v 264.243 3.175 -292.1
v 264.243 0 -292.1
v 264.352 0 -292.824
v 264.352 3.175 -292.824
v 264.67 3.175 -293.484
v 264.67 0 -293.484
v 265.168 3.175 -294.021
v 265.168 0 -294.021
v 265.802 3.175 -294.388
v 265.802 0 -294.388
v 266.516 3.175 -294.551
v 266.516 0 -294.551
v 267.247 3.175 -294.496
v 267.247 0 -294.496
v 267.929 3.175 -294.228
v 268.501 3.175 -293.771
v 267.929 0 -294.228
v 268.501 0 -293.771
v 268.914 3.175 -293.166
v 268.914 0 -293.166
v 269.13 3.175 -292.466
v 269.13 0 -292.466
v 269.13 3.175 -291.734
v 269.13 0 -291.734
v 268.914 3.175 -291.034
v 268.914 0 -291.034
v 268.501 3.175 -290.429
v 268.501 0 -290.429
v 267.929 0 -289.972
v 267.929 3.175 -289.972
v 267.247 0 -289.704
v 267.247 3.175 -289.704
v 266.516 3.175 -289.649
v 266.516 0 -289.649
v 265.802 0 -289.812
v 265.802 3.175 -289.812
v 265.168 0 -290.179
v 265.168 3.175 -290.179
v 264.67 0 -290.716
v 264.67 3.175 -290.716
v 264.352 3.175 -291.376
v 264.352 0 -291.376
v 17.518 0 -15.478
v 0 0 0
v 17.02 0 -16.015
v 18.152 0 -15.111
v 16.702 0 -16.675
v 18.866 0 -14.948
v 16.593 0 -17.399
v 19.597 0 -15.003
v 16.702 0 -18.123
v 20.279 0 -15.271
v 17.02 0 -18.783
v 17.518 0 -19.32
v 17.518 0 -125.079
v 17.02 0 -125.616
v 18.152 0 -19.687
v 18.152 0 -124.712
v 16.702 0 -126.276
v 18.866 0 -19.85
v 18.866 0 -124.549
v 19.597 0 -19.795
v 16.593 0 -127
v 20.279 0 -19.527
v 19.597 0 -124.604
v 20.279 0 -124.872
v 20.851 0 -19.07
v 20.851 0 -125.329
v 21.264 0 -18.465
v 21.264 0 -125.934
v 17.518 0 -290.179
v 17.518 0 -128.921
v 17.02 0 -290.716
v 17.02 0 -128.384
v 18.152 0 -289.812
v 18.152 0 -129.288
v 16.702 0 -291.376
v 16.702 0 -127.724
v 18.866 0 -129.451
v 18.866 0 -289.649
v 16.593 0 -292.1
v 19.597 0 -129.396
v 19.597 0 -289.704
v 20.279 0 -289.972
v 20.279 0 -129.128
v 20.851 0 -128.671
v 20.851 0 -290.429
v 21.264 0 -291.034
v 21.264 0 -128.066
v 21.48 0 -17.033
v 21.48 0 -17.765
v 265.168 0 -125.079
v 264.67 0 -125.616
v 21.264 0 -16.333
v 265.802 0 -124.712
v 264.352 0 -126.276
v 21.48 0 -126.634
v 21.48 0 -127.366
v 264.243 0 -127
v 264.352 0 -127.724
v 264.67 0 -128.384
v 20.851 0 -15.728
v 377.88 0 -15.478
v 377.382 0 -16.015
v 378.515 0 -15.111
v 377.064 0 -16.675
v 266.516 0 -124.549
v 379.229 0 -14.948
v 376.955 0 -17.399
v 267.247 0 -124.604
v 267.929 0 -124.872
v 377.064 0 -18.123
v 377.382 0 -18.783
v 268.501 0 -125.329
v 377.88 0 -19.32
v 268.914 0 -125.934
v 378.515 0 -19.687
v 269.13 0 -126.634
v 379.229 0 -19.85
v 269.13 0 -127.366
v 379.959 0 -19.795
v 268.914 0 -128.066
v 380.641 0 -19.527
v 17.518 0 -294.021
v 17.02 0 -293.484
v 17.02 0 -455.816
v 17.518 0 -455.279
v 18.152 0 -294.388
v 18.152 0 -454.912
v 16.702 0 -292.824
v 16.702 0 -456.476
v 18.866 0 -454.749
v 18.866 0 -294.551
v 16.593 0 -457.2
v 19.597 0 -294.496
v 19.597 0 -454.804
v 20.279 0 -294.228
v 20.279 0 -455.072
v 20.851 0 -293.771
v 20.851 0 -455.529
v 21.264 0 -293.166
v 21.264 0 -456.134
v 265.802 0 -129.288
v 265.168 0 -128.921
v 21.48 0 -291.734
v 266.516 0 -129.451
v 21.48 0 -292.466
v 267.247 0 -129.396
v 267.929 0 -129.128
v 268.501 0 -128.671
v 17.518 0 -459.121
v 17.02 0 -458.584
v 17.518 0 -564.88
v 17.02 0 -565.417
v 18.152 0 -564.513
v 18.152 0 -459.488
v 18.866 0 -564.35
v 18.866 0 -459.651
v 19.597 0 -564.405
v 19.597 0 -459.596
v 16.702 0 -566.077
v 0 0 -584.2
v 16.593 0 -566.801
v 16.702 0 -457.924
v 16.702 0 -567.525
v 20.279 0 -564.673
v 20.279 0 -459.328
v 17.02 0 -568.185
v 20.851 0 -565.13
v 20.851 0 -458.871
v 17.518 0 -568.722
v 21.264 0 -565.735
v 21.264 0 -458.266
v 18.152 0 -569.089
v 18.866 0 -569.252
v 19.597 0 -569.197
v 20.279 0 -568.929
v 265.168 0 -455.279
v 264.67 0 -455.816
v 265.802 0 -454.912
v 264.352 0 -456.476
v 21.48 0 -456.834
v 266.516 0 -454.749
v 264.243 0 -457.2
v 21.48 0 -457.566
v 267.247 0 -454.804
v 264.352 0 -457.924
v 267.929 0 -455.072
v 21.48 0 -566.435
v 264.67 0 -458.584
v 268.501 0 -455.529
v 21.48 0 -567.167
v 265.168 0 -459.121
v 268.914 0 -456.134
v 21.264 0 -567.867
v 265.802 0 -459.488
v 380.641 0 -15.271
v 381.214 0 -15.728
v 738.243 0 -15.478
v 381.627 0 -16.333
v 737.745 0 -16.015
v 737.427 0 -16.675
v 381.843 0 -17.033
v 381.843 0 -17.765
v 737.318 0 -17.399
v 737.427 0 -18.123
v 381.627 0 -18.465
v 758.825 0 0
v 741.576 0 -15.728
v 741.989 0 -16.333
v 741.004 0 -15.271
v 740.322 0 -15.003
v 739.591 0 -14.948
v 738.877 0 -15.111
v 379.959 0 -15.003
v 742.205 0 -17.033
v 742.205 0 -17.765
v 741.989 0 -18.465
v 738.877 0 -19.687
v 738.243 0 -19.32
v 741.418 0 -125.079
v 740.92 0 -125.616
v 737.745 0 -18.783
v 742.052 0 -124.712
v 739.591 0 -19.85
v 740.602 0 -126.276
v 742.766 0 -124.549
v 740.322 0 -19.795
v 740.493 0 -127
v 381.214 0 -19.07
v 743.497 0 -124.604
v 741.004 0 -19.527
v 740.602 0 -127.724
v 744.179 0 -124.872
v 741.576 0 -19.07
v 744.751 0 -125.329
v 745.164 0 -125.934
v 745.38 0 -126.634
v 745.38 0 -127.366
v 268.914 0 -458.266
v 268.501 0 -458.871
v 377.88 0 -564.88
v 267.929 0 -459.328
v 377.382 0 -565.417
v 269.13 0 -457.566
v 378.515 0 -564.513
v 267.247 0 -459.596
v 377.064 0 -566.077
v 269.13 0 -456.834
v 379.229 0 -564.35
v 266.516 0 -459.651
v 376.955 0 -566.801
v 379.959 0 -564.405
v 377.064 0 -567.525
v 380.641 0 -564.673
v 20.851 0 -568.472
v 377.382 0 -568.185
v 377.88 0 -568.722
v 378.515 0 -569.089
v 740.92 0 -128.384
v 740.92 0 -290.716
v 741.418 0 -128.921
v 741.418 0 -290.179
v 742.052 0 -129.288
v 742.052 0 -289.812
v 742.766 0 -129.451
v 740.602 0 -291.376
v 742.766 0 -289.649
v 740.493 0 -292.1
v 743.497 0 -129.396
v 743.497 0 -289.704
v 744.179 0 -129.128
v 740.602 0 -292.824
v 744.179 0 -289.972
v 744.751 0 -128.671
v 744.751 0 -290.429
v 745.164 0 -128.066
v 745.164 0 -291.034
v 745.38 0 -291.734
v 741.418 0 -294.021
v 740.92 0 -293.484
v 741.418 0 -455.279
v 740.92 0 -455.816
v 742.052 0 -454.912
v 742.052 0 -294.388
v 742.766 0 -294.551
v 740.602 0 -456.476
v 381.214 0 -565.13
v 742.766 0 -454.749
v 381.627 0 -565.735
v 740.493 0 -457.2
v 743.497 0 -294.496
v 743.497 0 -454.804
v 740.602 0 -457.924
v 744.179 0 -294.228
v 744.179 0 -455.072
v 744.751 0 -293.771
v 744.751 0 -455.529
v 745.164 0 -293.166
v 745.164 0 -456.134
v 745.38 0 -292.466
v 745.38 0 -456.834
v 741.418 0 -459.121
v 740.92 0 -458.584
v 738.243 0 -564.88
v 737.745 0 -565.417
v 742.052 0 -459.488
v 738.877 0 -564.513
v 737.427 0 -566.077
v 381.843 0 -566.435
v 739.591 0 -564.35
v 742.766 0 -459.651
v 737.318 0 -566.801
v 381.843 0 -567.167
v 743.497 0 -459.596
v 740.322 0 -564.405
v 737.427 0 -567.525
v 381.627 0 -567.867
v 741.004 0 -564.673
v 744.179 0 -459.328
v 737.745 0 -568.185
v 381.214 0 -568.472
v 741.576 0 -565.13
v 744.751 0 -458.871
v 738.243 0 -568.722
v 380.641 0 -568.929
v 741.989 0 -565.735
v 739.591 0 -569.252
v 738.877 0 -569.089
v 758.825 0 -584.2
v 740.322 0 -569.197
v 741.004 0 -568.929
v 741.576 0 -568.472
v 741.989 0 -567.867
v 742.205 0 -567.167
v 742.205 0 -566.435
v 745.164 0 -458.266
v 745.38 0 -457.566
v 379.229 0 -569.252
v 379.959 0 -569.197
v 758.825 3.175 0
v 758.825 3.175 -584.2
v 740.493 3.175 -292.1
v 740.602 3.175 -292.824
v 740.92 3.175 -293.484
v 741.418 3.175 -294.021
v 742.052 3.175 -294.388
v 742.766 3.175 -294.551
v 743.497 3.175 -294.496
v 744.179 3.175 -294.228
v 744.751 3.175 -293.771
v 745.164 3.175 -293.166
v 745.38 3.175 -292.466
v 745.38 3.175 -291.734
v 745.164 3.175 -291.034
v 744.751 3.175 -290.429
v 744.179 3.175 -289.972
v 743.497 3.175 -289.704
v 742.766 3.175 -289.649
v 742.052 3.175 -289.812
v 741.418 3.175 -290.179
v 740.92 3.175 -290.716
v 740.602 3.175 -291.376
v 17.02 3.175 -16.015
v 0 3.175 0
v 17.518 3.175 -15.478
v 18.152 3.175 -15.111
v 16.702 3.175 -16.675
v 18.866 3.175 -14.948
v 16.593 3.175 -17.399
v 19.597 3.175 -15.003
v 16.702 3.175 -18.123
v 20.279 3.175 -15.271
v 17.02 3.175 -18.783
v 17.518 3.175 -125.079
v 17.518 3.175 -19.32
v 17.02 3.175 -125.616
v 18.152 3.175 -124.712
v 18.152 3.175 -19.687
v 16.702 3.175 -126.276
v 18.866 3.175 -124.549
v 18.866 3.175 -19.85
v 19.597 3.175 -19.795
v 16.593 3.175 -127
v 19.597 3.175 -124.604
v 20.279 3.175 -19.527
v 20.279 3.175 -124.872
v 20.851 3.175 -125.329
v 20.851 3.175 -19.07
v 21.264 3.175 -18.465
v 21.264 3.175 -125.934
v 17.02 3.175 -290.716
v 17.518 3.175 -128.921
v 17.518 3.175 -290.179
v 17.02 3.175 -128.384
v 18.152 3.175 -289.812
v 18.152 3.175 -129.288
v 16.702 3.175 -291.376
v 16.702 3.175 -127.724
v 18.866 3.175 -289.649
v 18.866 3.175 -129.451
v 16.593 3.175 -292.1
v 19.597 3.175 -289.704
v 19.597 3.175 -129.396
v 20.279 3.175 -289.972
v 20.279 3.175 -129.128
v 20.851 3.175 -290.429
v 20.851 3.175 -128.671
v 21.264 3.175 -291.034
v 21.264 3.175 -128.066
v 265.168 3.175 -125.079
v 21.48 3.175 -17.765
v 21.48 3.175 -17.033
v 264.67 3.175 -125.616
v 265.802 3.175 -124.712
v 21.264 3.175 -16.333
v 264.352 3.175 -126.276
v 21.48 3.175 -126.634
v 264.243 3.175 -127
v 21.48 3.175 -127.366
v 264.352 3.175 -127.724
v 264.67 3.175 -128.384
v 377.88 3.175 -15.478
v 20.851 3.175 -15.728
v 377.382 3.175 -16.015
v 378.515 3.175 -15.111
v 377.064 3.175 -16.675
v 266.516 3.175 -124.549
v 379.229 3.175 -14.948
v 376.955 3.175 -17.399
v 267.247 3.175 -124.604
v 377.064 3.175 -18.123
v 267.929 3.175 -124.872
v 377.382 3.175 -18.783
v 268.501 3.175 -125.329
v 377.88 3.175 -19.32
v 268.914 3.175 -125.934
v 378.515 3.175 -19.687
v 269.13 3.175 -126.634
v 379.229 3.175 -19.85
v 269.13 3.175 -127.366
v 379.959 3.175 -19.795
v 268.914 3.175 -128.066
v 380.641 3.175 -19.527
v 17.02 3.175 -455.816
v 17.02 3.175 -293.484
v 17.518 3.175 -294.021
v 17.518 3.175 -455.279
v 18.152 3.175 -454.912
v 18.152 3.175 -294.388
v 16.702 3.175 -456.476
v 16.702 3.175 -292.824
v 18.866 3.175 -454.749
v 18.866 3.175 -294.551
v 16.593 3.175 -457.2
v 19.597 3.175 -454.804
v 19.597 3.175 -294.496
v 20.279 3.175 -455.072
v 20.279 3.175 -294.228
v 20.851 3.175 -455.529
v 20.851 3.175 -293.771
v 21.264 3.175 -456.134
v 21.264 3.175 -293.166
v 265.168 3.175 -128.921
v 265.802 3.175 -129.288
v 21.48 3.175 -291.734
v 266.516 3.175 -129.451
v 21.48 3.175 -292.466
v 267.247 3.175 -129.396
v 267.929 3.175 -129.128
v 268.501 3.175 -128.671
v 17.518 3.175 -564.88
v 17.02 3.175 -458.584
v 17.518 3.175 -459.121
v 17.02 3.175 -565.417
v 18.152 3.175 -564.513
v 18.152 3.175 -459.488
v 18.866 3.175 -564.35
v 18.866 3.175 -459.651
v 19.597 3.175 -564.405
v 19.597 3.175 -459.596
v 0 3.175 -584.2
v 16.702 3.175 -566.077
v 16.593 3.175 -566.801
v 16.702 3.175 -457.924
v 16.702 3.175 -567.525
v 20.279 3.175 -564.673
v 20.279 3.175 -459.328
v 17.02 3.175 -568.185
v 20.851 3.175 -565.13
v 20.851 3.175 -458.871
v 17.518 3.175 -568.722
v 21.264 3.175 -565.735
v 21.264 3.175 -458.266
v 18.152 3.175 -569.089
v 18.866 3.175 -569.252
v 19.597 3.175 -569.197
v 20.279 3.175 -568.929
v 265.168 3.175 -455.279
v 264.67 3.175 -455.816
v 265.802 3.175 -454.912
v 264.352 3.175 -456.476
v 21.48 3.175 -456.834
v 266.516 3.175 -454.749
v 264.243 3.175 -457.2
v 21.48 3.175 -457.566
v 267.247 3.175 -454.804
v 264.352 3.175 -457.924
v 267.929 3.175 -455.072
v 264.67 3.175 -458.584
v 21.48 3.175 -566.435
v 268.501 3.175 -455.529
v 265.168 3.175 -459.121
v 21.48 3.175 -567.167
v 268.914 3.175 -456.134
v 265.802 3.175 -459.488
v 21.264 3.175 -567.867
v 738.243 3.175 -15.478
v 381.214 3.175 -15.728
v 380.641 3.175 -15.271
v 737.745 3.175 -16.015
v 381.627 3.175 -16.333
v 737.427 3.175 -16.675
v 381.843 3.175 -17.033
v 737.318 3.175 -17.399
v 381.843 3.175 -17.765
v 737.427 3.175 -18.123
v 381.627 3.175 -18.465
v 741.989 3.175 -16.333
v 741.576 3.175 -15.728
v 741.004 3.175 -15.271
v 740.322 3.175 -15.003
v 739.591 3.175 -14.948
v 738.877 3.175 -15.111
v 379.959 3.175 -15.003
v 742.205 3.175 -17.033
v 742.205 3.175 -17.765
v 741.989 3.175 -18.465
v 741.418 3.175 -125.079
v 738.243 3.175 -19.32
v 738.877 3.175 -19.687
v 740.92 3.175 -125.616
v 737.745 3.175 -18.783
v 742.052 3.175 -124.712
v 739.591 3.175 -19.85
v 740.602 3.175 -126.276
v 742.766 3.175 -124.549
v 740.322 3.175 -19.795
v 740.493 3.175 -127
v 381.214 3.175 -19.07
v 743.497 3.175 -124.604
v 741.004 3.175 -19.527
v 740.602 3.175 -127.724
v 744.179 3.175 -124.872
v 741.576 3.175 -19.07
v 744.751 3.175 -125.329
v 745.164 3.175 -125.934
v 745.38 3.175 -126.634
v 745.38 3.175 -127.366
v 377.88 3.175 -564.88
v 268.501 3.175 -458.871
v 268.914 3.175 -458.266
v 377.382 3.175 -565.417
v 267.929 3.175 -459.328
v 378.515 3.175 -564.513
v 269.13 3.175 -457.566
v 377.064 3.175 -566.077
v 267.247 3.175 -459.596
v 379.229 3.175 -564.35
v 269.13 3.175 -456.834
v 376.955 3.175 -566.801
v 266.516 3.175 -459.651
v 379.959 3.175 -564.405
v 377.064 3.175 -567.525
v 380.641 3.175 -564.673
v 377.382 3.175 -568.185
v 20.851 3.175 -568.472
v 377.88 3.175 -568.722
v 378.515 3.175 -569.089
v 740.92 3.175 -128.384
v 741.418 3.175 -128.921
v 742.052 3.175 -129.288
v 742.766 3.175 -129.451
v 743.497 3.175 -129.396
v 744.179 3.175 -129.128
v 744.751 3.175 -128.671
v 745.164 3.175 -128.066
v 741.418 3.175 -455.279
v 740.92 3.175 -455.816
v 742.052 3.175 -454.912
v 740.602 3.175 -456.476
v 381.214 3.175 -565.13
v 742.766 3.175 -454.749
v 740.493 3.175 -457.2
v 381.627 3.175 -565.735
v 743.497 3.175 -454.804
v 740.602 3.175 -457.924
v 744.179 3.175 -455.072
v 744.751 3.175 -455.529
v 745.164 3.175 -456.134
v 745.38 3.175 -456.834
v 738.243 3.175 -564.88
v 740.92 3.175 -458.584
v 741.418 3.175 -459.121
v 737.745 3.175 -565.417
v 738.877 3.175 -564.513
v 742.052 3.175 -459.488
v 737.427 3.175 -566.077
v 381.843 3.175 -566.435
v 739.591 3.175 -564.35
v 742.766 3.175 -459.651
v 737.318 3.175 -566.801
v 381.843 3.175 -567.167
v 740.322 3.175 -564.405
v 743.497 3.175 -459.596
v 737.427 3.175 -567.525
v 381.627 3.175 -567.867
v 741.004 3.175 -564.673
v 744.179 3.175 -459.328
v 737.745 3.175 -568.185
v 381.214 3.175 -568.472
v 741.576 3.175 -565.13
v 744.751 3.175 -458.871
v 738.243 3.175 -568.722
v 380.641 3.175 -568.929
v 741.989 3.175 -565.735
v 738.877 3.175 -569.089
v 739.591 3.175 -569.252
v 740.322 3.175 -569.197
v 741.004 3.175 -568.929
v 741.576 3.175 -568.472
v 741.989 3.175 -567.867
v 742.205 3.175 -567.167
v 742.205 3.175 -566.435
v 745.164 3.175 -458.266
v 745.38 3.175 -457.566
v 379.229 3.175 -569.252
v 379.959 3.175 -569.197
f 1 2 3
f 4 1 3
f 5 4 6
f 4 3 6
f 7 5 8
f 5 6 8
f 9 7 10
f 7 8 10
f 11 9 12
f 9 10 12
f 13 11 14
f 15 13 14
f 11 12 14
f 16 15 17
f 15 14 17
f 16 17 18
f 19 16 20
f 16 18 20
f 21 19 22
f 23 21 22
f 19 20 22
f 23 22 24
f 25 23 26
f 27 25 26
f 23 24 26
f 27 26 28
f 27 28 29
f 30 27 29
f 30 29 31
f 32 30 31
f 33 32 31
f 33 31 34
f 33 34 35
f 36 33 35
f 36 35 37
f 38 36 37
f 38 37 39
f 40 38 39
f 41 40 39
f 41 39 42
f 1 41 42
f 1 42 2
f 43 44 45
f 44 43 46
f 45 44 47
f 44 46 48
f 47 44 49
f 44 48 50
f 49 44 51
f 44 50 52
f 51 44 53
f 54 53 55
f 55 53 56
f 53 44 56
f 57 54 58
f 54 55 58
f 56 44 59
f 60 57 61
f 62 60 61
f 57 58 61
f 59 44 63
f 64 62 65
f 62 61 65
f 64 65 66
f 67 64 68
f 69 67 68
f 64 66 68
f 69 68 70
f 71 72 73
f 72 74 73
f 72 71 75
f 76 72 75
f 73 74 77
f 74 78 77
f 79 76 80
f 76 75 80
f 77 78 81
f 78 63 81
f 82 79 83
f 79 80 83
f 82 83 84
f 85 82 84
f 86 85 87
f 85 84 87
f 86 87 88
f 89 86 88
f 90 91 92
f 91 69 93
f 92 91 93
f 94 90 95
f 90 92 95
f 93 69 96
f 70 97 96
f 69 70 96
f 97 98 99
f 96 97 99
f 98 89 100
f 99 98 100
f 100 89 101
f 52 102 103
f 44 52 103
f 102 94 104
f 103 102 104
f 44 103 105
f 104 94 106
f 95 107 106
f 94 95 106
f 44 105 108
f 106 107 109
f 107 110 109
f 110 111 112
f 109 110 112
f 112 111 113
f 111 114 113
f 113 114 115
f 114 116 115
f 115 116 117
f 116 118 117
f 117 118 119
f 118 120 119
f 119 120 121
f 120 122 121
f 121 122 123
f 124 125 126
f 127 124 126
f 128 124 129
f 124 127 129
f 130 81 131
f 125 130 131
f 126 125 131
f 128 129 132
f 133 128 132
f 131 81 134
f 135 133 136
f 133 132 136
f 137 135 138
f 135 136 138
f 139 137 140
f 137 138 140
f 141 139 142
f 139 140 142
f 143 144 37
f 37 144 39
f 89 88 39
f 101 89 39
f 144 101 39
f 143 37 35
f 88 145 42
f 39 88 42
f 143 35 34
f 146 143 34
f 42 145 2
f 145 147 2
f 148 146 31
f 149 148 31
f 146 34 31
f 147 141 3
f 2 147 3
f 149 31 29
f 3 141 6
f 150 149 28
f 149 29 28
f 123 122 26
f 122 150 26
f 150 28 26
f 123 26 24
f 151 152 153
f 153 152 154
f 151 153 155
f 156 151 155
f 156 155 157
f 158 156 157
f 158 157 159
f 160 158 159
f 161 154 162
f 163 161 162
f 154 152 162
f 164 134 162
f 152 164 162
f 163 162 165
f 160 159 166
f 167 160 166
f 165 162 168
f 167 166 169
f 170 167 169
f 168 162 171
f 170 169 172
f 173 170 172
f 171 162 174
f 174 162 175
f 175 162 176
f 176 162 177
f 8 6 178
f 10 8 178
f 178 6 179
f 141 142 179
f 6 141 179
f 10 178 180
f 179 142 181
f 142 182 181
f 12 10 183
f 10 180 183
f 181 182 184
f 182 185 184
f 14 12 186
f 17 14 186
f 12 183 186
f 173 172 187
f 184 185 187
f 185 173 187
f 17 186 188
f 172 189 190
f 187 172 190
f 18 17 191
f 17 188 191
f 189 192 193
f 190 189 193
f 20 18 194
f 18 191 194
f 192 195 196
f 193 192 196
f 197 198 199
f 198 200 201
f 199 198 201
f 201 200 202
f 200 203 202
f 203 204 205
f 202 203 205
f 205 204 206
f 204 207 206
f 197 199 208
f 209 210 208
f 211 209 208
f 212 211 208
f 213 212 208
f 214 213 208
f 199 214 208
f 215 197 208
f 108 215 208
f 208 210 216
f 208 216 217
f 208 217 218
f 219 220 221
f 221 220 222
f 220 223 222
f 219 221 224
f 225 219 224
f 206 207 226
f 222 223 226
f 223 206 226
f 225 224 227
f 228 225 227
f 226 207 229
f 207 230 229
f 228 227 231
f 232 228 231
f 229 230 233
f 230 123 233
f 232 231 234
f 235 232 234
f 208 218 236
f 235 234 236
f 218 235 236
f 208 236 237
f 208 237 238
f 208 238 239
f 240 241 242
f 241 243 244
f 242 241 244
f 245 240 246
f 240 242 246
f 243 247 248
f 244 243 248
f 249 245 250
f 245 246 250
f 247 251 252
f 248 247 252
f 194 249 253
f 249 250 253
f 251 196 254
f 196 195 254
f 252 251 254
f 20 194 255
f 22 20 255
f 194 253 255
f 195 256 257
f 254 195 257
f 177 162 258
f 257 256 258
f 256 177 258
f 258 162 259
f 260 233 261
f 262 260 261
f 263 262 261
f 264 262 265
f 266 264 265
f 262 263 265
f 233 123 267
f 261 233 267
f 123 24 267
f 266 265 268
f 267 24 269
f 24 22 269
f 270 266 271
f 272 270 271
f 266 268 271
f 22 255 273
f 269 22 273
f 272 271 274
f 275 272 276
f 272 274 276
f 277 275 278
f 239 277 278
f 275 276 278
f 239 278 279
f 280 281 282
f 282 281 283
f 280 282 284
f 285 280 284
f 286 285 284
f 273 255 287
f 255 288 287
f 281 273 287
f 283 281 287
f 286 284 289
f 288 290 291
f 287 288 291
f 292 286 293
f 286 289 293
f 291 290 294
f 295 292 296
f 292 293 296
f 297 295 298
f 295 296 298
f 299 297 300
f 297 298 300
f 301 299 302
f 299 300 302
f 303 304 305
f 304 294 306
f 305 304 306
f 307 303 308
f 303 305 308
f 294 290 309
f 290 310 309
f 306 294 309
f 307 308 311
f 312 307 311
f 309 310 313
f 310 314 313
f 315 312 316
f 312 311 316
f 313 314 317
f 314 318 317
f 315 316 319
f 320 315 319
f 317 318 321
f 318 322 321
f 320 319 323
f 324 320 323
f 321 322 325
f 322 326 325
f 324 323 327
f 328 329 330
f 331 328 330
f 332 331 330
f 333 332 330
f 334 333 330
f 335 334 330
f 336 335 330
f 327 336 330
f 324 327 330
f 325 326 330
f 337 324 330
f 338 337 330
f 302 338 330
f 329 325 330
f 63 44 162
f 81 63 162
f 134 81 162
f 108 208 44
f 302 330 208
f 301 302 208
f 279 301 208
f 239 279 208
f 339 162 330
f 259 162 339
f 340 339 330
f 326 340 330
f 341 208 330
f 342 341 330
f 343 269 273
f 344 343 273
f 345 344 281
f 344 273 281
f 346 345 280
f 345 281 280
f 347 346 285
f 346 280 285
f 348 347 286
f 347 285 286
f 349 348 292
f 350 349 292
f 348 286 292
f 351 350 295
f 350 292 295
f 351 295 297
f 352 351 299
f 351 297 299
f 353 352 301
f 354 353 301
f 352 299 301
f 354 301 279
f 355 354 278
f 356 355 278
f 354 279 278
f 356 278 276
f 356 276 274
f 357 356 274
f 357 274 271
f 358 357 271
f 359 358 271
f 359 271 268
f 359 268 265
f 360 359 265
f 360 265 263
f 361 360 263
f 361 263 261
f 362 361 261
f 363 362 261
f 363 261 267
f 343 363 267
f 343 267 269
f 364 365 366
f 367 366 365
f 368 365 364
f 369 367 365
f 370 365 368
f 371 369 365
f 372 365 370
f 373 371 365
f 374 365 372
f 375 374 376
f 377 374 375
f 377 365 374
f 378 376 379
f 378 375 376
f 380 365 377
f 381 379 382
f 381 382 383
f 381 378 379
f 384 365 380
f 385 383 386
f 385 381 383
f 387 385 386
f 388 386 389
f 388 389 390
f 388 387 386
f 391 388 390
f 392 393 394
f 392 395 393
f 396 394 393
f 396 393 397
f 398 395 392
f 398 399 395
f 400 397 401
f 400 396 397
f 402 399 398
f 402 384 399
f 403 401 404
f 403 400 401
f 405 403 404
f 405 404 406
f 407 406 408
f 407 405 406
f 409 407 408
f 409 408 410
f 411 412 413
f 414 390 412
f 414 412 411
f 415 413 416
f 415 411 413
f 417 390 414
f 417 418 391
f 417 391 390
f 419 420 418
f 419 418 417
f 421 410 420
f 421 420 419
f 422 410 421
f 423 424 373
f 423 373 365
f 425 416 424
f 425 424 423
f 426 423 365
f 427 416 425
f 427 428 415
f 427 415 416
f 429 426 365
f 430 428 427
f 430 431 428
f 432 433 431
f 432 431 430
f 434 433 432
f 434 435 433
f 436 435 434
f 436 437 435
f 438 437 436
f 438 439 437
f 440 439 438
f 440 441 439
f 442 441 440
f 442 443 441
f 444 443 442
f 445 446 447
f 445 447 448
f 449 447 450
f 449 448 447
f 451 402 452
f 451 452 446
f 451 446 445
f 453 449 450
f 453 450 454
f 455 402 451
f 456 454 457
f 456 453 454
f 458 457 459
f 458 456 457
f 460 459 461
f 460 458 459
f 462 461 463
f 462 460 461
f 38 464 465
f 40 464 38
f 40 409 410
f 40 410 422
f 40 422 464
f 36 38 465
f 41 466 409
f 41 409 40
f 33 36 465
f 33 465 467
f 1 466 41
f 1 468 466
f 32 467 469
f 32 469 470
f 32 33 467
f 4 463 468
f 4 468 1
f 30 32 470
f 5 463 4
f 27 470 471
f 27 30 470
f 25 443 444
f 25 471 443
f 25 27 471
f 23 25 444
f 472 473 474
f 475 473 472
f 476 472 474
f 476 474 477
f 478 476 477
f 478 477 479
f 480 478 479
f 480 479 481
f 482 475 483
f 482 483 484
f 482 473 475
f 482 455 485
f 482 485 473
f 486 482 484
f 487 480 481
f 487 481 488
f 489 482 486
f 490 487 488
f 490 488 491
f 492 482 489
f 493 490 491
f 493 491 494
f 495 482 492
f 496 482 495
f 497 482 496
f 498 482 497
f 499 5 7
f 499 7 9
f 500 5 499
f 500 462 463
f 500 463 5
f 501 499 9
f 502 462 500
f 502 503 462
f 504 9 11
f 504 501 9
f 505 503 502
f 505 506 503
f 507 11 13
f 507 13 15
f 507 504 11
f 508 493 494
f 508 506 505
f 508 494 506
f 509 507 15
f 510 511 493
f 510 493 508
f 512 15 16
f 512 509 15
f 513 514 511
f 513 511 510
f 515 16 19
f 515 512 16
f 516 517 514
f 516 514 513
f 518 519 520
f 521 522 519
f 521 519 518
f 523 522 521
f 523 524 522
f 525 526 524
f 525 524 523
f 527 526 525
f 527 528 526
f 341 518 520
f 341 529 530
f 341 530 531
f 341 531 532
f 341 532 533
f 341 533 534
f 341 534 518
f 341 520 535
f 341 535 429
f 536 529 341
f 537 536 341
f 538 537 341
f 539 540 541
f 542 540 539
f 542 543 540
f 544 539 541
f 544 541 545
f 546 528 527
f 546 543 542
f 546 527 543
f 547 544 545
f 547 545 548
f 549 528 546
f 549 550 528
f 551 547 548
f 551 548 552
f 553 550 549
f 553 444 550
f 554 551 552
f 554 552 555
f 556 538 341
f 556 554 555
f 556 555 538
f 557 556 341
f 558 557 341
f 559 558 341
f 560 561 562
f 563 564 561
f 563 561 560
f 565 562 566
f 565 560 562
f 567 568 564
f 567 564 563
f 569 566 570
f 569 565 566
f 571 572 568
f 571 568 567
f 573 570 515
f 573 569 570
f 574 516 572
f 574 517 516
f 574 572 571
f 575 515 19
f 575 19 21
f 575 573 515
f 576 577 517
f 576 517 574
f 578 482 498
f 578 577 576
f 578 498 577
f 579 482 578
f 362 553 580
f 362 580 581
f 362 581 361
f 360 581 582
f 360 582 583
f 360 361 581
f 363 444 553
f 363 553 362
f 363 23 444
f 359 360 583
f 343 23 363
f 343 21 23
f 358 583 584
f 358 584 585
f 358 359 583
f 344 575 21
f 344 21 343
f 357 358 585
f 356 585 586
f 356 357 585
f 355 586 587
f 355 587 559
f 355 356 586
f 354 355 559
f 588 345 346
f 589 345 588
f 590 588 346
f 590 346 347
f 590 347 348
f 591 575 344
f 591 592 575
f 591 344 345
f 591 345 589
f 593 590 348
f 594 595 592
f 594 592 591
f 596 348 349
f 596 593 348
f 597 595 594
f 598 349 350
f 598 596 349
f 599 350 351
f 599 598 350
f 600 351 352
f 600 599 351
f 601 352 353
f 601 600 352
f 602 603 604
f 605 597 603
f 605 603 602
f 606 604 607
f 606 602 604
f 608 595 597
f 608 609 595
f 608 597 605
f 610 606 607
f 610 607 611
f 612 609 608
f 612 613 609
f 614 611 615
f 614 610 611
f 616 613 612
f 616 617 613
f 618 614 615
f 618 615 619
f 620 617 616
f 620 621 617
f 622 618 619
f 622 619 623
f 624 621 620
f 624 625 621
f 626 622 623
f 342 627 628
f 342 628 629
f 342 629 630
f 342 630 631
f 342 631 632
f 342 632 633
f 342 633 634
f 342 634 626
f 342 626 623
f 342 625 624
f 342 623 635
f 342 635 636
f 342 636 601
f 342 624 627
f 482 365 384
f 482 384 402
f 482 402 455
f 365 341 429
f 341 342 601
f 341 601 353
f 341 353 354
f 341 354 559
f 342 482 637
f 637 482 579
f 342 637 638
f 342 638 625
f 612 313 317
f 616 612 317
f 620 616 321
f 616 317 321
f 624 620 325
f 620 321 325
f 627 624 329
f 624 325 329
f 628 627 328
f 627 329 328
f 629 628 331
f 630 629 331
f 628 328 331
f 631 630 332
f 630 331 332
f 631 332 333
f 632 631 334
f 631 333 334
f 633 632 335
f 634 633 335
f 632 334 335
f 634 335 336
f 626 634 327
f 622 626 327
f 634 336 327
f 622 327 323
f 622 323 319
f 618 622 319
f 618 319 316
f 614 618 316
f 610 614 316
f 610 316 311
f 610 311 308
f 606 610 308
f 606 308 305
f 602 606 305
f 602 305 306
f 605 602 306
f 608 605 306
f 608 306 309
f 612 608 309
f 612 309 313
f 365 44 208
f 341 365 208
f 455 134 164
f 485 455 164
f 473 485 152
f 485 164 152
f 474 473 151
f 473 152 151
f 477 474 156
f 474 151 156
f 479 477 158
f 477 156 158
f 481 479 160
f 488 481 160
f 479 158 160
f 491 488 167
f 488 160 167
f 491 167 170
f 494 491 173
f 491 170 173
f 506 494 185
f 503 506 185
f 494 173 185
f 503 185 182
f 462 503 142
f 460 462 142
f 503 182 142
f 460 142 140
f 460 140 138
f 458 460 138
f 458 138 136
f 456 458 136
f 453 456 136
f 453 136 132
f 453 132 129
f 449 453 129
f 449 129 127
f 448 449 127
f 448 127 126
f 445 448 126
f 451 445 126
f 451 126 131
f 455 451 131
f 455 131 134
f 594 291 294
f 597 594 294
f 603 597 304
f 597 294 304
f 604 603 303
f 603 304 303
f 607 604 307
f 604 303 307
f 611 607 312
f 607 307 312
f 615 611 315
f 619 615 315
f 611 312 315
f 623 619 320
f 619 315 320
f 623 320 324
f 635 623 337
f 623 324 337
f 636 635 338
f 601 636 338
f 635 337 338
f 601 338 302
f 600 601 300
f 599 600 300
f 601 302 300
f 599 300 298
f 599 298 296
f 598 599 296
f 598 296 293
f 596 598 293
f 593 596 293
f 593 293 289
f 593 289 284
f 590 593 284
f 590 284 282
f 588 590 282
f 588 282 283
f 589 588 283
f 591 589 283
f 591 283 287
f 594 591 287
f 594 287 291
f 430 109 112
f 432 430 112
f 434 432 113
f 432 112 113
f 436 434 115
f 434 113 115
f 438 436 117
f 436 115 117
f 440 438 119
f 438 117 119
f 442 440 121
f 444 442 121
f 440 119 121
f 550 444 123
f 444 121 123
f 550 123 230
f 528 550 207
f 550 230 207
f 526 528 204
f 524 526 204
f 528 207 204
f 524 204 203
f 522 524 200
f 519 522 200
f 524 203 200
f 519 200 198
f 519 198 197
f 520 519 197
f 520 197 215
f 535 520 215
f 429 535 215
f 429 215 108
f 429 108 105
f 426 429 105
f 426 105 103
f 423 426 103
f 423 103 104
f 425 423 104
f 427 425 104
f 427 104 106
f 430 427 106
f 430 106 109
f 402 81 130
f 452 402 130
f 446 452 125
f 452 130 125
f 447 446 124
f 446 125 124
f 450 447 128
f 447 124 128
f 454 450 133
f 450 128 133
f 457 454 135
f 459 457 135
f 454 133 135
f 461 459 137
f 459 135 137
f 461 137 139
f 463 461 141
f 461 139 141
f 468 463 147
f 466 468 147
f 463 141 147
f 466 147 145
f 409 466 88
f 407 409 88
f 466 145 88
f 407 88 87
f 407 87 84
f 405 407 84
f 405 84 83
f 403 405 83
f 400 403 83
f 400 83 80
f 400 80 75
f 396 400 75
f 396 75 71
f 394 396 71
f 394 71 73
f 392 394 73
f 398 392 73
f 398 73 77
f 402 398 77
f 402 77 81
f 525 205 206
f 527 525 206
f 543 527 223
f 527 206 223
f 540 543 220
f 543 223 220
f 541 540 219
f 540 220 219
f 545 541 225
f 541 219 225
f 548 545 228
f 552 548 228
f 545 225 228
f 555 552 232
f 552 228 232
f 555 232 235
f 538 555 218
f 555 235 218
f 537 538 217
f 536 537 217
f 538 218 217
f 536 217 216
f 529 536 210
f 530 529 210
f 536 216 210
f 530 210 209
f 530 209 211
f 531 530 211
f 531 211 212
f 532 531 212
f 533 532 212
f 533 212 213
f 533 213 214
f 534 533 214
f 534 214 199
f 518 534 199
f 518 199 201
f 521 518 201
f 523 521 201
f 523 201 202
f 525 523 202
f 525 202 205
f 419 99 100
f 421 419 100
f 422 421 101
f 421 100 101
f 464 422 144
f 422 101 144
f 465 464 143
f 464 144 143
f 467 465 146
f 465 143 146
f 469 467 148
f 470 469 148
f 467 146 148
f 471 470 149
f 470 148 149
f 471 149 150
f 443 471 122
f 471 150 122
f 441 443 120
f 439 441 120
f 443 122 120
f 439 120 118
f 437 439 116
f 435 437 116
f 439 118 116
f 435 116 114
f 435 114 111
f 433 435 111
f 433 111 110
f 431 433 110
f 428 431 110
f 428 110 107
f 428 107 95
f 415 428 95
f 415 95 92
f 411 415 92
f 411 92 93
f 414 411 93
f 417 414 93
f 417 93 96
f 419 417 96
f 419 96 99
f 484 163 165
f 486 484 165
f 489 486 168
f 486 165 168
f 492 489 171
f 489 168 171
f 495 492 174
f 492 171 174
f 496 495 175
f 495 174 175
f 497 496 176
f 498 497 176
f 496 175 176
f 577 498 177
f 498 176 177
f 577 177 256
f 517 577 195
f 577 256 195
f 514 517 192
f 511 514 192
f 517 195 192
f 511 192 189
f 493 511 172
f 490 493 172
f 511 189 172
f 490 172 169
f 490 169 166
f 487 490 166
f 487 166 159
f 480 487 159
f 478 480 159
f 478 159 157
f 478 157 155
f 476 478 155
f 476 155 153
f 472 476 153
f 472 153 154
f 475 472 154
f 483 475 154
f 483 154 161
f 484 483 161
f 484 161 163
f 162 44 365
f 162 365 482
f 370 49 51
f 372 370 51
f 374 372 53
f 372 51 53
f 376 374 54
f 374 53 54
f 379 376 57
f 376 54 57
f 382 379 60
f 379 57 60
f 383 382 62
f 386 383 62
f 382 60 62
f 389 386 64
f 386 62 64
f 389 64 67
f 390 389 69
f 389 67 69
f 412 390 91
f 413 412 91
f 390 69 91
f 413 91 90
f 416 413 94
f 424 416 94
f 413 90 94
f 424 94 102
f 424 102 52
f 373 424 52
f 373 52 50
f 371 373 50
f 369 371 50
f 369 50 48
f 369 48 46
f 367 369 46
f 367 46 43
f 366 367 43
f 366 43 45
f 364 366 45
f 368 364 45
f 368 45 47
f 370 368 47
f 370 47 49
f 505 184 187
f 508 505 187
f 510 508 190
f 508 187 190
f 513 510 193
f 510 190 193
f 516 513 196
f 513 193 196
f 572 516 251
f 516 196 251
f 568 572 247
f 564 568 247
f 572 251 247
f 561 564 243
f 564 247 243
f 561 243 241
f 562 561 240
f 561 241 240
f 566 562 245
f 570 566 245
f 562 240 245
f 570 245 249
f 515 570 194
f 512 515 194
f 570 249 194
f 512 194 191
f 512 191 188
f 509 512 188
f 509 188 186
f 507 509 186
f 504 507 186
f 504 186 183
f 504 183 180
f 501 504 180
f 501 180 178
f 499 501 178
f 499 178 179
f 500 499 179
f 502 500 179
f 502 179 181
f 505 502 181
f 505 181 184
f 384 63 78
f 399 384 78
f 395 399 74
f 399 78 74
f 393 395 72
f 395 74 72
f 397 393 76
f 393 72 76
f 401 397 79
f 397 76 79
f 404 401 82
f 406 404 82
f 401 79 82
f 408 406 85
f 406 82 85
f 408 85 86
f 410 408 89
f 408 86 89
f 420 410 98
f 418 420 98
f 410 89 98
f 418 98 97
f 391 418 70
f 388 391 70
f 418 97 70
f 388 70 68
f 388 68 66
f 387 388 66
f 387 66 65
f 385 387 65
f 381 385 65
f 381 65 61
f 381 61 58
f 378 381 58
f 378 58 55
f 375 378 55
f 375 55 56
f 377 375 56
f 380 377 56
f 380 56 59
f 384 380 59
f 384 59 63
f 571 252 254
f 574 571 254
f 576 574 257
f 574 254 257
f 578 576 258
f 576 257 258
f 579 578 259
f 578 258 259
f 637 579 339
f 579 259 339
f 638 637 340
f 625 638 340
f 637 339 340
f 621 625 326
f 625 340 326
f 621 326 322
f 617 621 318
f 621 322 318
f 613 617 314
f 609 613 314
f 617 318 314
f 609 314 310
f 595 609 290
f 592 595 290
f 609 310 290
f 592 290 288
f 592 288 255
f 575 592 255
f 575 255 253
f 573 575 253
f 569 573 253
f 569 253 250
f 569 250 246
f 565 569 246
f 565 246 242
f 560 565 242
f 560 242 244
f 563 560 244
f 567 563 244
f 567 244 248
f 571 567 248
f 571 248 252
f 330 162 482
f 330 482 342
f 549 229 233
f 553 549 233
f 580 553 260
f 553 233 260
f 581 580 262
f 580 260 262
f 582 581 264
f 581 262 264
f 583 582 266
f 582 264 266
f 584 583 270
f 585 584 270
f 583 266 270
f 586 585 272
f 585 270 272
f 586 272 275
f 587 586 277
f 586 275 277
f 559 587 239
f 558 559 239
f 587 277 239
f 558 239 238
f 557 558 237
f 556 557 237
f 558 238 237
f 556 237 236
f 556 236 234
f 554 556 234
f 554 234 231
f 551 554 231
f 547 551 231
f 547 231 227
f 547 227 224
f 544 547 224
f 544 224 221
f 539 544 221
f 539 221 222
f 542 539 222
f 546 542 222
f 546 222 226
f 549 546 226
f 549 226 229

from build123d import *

# Parameters (mm, degrees)
SKETCH1_W                    = 758.825
SKETCH1_H                    = 584.2
BOSS_EXTRUDE1_DEPTH          = 3.175
F_10_0_1935_DIAMETER_HOLE2_D = 4.9149
F_10_0_1935_DIAMETER_HOLE3_D = 4.9149


with BuildPart() as part:
    # Sketch1 → Boss-Extrude1 (new body)
    with BuildSketch(Plane(origin=(0, 0, 0), x_dir=(1, 0, 0), z_dir=(0, 1, 0))):
        with Locations((379.4125, 292.1)):
            Rectangle(SKETCH1_W, SKETCH1_H)
    extrude(amount=BOSS_EXTRUDE1_DEPTH)

    # #10 (0.1935) Diameter Hole2 (through all)
    with Locations(Plane(origin=(0, 3.175, 0), x_dir=(1, 0, 0), z_dir=(0, 1, 0))):
        with Locations((19.05, 566.801), (739.775, 566.801), (19.05, 17.399), (739.775, 17.399), (379.4125, 566.801), (19.05, 292.1), (379.4125, 17.399), (742.95, 292.1), (19.05, 457.2), (19.05, 127), (742.95, 127), (742.95, 457.2)):
            Hole(F_10_0_1935_DIAMETER_HOLE2_D / 2)

    # #10 (0.1935) Diameter Hole3 (through all)
    with Locations(Plane(origin=(0, 3.175, 0), x_dir=(1, 0, 0), z_dir=(0, 1, 0))):
        with Locations((266.7, 292.1), (266.7, 127), (266.7, 457.2)):
            Hole(F_10_0_1935_DIAMETER_HOLE3_D / 2)


solid = part.part
